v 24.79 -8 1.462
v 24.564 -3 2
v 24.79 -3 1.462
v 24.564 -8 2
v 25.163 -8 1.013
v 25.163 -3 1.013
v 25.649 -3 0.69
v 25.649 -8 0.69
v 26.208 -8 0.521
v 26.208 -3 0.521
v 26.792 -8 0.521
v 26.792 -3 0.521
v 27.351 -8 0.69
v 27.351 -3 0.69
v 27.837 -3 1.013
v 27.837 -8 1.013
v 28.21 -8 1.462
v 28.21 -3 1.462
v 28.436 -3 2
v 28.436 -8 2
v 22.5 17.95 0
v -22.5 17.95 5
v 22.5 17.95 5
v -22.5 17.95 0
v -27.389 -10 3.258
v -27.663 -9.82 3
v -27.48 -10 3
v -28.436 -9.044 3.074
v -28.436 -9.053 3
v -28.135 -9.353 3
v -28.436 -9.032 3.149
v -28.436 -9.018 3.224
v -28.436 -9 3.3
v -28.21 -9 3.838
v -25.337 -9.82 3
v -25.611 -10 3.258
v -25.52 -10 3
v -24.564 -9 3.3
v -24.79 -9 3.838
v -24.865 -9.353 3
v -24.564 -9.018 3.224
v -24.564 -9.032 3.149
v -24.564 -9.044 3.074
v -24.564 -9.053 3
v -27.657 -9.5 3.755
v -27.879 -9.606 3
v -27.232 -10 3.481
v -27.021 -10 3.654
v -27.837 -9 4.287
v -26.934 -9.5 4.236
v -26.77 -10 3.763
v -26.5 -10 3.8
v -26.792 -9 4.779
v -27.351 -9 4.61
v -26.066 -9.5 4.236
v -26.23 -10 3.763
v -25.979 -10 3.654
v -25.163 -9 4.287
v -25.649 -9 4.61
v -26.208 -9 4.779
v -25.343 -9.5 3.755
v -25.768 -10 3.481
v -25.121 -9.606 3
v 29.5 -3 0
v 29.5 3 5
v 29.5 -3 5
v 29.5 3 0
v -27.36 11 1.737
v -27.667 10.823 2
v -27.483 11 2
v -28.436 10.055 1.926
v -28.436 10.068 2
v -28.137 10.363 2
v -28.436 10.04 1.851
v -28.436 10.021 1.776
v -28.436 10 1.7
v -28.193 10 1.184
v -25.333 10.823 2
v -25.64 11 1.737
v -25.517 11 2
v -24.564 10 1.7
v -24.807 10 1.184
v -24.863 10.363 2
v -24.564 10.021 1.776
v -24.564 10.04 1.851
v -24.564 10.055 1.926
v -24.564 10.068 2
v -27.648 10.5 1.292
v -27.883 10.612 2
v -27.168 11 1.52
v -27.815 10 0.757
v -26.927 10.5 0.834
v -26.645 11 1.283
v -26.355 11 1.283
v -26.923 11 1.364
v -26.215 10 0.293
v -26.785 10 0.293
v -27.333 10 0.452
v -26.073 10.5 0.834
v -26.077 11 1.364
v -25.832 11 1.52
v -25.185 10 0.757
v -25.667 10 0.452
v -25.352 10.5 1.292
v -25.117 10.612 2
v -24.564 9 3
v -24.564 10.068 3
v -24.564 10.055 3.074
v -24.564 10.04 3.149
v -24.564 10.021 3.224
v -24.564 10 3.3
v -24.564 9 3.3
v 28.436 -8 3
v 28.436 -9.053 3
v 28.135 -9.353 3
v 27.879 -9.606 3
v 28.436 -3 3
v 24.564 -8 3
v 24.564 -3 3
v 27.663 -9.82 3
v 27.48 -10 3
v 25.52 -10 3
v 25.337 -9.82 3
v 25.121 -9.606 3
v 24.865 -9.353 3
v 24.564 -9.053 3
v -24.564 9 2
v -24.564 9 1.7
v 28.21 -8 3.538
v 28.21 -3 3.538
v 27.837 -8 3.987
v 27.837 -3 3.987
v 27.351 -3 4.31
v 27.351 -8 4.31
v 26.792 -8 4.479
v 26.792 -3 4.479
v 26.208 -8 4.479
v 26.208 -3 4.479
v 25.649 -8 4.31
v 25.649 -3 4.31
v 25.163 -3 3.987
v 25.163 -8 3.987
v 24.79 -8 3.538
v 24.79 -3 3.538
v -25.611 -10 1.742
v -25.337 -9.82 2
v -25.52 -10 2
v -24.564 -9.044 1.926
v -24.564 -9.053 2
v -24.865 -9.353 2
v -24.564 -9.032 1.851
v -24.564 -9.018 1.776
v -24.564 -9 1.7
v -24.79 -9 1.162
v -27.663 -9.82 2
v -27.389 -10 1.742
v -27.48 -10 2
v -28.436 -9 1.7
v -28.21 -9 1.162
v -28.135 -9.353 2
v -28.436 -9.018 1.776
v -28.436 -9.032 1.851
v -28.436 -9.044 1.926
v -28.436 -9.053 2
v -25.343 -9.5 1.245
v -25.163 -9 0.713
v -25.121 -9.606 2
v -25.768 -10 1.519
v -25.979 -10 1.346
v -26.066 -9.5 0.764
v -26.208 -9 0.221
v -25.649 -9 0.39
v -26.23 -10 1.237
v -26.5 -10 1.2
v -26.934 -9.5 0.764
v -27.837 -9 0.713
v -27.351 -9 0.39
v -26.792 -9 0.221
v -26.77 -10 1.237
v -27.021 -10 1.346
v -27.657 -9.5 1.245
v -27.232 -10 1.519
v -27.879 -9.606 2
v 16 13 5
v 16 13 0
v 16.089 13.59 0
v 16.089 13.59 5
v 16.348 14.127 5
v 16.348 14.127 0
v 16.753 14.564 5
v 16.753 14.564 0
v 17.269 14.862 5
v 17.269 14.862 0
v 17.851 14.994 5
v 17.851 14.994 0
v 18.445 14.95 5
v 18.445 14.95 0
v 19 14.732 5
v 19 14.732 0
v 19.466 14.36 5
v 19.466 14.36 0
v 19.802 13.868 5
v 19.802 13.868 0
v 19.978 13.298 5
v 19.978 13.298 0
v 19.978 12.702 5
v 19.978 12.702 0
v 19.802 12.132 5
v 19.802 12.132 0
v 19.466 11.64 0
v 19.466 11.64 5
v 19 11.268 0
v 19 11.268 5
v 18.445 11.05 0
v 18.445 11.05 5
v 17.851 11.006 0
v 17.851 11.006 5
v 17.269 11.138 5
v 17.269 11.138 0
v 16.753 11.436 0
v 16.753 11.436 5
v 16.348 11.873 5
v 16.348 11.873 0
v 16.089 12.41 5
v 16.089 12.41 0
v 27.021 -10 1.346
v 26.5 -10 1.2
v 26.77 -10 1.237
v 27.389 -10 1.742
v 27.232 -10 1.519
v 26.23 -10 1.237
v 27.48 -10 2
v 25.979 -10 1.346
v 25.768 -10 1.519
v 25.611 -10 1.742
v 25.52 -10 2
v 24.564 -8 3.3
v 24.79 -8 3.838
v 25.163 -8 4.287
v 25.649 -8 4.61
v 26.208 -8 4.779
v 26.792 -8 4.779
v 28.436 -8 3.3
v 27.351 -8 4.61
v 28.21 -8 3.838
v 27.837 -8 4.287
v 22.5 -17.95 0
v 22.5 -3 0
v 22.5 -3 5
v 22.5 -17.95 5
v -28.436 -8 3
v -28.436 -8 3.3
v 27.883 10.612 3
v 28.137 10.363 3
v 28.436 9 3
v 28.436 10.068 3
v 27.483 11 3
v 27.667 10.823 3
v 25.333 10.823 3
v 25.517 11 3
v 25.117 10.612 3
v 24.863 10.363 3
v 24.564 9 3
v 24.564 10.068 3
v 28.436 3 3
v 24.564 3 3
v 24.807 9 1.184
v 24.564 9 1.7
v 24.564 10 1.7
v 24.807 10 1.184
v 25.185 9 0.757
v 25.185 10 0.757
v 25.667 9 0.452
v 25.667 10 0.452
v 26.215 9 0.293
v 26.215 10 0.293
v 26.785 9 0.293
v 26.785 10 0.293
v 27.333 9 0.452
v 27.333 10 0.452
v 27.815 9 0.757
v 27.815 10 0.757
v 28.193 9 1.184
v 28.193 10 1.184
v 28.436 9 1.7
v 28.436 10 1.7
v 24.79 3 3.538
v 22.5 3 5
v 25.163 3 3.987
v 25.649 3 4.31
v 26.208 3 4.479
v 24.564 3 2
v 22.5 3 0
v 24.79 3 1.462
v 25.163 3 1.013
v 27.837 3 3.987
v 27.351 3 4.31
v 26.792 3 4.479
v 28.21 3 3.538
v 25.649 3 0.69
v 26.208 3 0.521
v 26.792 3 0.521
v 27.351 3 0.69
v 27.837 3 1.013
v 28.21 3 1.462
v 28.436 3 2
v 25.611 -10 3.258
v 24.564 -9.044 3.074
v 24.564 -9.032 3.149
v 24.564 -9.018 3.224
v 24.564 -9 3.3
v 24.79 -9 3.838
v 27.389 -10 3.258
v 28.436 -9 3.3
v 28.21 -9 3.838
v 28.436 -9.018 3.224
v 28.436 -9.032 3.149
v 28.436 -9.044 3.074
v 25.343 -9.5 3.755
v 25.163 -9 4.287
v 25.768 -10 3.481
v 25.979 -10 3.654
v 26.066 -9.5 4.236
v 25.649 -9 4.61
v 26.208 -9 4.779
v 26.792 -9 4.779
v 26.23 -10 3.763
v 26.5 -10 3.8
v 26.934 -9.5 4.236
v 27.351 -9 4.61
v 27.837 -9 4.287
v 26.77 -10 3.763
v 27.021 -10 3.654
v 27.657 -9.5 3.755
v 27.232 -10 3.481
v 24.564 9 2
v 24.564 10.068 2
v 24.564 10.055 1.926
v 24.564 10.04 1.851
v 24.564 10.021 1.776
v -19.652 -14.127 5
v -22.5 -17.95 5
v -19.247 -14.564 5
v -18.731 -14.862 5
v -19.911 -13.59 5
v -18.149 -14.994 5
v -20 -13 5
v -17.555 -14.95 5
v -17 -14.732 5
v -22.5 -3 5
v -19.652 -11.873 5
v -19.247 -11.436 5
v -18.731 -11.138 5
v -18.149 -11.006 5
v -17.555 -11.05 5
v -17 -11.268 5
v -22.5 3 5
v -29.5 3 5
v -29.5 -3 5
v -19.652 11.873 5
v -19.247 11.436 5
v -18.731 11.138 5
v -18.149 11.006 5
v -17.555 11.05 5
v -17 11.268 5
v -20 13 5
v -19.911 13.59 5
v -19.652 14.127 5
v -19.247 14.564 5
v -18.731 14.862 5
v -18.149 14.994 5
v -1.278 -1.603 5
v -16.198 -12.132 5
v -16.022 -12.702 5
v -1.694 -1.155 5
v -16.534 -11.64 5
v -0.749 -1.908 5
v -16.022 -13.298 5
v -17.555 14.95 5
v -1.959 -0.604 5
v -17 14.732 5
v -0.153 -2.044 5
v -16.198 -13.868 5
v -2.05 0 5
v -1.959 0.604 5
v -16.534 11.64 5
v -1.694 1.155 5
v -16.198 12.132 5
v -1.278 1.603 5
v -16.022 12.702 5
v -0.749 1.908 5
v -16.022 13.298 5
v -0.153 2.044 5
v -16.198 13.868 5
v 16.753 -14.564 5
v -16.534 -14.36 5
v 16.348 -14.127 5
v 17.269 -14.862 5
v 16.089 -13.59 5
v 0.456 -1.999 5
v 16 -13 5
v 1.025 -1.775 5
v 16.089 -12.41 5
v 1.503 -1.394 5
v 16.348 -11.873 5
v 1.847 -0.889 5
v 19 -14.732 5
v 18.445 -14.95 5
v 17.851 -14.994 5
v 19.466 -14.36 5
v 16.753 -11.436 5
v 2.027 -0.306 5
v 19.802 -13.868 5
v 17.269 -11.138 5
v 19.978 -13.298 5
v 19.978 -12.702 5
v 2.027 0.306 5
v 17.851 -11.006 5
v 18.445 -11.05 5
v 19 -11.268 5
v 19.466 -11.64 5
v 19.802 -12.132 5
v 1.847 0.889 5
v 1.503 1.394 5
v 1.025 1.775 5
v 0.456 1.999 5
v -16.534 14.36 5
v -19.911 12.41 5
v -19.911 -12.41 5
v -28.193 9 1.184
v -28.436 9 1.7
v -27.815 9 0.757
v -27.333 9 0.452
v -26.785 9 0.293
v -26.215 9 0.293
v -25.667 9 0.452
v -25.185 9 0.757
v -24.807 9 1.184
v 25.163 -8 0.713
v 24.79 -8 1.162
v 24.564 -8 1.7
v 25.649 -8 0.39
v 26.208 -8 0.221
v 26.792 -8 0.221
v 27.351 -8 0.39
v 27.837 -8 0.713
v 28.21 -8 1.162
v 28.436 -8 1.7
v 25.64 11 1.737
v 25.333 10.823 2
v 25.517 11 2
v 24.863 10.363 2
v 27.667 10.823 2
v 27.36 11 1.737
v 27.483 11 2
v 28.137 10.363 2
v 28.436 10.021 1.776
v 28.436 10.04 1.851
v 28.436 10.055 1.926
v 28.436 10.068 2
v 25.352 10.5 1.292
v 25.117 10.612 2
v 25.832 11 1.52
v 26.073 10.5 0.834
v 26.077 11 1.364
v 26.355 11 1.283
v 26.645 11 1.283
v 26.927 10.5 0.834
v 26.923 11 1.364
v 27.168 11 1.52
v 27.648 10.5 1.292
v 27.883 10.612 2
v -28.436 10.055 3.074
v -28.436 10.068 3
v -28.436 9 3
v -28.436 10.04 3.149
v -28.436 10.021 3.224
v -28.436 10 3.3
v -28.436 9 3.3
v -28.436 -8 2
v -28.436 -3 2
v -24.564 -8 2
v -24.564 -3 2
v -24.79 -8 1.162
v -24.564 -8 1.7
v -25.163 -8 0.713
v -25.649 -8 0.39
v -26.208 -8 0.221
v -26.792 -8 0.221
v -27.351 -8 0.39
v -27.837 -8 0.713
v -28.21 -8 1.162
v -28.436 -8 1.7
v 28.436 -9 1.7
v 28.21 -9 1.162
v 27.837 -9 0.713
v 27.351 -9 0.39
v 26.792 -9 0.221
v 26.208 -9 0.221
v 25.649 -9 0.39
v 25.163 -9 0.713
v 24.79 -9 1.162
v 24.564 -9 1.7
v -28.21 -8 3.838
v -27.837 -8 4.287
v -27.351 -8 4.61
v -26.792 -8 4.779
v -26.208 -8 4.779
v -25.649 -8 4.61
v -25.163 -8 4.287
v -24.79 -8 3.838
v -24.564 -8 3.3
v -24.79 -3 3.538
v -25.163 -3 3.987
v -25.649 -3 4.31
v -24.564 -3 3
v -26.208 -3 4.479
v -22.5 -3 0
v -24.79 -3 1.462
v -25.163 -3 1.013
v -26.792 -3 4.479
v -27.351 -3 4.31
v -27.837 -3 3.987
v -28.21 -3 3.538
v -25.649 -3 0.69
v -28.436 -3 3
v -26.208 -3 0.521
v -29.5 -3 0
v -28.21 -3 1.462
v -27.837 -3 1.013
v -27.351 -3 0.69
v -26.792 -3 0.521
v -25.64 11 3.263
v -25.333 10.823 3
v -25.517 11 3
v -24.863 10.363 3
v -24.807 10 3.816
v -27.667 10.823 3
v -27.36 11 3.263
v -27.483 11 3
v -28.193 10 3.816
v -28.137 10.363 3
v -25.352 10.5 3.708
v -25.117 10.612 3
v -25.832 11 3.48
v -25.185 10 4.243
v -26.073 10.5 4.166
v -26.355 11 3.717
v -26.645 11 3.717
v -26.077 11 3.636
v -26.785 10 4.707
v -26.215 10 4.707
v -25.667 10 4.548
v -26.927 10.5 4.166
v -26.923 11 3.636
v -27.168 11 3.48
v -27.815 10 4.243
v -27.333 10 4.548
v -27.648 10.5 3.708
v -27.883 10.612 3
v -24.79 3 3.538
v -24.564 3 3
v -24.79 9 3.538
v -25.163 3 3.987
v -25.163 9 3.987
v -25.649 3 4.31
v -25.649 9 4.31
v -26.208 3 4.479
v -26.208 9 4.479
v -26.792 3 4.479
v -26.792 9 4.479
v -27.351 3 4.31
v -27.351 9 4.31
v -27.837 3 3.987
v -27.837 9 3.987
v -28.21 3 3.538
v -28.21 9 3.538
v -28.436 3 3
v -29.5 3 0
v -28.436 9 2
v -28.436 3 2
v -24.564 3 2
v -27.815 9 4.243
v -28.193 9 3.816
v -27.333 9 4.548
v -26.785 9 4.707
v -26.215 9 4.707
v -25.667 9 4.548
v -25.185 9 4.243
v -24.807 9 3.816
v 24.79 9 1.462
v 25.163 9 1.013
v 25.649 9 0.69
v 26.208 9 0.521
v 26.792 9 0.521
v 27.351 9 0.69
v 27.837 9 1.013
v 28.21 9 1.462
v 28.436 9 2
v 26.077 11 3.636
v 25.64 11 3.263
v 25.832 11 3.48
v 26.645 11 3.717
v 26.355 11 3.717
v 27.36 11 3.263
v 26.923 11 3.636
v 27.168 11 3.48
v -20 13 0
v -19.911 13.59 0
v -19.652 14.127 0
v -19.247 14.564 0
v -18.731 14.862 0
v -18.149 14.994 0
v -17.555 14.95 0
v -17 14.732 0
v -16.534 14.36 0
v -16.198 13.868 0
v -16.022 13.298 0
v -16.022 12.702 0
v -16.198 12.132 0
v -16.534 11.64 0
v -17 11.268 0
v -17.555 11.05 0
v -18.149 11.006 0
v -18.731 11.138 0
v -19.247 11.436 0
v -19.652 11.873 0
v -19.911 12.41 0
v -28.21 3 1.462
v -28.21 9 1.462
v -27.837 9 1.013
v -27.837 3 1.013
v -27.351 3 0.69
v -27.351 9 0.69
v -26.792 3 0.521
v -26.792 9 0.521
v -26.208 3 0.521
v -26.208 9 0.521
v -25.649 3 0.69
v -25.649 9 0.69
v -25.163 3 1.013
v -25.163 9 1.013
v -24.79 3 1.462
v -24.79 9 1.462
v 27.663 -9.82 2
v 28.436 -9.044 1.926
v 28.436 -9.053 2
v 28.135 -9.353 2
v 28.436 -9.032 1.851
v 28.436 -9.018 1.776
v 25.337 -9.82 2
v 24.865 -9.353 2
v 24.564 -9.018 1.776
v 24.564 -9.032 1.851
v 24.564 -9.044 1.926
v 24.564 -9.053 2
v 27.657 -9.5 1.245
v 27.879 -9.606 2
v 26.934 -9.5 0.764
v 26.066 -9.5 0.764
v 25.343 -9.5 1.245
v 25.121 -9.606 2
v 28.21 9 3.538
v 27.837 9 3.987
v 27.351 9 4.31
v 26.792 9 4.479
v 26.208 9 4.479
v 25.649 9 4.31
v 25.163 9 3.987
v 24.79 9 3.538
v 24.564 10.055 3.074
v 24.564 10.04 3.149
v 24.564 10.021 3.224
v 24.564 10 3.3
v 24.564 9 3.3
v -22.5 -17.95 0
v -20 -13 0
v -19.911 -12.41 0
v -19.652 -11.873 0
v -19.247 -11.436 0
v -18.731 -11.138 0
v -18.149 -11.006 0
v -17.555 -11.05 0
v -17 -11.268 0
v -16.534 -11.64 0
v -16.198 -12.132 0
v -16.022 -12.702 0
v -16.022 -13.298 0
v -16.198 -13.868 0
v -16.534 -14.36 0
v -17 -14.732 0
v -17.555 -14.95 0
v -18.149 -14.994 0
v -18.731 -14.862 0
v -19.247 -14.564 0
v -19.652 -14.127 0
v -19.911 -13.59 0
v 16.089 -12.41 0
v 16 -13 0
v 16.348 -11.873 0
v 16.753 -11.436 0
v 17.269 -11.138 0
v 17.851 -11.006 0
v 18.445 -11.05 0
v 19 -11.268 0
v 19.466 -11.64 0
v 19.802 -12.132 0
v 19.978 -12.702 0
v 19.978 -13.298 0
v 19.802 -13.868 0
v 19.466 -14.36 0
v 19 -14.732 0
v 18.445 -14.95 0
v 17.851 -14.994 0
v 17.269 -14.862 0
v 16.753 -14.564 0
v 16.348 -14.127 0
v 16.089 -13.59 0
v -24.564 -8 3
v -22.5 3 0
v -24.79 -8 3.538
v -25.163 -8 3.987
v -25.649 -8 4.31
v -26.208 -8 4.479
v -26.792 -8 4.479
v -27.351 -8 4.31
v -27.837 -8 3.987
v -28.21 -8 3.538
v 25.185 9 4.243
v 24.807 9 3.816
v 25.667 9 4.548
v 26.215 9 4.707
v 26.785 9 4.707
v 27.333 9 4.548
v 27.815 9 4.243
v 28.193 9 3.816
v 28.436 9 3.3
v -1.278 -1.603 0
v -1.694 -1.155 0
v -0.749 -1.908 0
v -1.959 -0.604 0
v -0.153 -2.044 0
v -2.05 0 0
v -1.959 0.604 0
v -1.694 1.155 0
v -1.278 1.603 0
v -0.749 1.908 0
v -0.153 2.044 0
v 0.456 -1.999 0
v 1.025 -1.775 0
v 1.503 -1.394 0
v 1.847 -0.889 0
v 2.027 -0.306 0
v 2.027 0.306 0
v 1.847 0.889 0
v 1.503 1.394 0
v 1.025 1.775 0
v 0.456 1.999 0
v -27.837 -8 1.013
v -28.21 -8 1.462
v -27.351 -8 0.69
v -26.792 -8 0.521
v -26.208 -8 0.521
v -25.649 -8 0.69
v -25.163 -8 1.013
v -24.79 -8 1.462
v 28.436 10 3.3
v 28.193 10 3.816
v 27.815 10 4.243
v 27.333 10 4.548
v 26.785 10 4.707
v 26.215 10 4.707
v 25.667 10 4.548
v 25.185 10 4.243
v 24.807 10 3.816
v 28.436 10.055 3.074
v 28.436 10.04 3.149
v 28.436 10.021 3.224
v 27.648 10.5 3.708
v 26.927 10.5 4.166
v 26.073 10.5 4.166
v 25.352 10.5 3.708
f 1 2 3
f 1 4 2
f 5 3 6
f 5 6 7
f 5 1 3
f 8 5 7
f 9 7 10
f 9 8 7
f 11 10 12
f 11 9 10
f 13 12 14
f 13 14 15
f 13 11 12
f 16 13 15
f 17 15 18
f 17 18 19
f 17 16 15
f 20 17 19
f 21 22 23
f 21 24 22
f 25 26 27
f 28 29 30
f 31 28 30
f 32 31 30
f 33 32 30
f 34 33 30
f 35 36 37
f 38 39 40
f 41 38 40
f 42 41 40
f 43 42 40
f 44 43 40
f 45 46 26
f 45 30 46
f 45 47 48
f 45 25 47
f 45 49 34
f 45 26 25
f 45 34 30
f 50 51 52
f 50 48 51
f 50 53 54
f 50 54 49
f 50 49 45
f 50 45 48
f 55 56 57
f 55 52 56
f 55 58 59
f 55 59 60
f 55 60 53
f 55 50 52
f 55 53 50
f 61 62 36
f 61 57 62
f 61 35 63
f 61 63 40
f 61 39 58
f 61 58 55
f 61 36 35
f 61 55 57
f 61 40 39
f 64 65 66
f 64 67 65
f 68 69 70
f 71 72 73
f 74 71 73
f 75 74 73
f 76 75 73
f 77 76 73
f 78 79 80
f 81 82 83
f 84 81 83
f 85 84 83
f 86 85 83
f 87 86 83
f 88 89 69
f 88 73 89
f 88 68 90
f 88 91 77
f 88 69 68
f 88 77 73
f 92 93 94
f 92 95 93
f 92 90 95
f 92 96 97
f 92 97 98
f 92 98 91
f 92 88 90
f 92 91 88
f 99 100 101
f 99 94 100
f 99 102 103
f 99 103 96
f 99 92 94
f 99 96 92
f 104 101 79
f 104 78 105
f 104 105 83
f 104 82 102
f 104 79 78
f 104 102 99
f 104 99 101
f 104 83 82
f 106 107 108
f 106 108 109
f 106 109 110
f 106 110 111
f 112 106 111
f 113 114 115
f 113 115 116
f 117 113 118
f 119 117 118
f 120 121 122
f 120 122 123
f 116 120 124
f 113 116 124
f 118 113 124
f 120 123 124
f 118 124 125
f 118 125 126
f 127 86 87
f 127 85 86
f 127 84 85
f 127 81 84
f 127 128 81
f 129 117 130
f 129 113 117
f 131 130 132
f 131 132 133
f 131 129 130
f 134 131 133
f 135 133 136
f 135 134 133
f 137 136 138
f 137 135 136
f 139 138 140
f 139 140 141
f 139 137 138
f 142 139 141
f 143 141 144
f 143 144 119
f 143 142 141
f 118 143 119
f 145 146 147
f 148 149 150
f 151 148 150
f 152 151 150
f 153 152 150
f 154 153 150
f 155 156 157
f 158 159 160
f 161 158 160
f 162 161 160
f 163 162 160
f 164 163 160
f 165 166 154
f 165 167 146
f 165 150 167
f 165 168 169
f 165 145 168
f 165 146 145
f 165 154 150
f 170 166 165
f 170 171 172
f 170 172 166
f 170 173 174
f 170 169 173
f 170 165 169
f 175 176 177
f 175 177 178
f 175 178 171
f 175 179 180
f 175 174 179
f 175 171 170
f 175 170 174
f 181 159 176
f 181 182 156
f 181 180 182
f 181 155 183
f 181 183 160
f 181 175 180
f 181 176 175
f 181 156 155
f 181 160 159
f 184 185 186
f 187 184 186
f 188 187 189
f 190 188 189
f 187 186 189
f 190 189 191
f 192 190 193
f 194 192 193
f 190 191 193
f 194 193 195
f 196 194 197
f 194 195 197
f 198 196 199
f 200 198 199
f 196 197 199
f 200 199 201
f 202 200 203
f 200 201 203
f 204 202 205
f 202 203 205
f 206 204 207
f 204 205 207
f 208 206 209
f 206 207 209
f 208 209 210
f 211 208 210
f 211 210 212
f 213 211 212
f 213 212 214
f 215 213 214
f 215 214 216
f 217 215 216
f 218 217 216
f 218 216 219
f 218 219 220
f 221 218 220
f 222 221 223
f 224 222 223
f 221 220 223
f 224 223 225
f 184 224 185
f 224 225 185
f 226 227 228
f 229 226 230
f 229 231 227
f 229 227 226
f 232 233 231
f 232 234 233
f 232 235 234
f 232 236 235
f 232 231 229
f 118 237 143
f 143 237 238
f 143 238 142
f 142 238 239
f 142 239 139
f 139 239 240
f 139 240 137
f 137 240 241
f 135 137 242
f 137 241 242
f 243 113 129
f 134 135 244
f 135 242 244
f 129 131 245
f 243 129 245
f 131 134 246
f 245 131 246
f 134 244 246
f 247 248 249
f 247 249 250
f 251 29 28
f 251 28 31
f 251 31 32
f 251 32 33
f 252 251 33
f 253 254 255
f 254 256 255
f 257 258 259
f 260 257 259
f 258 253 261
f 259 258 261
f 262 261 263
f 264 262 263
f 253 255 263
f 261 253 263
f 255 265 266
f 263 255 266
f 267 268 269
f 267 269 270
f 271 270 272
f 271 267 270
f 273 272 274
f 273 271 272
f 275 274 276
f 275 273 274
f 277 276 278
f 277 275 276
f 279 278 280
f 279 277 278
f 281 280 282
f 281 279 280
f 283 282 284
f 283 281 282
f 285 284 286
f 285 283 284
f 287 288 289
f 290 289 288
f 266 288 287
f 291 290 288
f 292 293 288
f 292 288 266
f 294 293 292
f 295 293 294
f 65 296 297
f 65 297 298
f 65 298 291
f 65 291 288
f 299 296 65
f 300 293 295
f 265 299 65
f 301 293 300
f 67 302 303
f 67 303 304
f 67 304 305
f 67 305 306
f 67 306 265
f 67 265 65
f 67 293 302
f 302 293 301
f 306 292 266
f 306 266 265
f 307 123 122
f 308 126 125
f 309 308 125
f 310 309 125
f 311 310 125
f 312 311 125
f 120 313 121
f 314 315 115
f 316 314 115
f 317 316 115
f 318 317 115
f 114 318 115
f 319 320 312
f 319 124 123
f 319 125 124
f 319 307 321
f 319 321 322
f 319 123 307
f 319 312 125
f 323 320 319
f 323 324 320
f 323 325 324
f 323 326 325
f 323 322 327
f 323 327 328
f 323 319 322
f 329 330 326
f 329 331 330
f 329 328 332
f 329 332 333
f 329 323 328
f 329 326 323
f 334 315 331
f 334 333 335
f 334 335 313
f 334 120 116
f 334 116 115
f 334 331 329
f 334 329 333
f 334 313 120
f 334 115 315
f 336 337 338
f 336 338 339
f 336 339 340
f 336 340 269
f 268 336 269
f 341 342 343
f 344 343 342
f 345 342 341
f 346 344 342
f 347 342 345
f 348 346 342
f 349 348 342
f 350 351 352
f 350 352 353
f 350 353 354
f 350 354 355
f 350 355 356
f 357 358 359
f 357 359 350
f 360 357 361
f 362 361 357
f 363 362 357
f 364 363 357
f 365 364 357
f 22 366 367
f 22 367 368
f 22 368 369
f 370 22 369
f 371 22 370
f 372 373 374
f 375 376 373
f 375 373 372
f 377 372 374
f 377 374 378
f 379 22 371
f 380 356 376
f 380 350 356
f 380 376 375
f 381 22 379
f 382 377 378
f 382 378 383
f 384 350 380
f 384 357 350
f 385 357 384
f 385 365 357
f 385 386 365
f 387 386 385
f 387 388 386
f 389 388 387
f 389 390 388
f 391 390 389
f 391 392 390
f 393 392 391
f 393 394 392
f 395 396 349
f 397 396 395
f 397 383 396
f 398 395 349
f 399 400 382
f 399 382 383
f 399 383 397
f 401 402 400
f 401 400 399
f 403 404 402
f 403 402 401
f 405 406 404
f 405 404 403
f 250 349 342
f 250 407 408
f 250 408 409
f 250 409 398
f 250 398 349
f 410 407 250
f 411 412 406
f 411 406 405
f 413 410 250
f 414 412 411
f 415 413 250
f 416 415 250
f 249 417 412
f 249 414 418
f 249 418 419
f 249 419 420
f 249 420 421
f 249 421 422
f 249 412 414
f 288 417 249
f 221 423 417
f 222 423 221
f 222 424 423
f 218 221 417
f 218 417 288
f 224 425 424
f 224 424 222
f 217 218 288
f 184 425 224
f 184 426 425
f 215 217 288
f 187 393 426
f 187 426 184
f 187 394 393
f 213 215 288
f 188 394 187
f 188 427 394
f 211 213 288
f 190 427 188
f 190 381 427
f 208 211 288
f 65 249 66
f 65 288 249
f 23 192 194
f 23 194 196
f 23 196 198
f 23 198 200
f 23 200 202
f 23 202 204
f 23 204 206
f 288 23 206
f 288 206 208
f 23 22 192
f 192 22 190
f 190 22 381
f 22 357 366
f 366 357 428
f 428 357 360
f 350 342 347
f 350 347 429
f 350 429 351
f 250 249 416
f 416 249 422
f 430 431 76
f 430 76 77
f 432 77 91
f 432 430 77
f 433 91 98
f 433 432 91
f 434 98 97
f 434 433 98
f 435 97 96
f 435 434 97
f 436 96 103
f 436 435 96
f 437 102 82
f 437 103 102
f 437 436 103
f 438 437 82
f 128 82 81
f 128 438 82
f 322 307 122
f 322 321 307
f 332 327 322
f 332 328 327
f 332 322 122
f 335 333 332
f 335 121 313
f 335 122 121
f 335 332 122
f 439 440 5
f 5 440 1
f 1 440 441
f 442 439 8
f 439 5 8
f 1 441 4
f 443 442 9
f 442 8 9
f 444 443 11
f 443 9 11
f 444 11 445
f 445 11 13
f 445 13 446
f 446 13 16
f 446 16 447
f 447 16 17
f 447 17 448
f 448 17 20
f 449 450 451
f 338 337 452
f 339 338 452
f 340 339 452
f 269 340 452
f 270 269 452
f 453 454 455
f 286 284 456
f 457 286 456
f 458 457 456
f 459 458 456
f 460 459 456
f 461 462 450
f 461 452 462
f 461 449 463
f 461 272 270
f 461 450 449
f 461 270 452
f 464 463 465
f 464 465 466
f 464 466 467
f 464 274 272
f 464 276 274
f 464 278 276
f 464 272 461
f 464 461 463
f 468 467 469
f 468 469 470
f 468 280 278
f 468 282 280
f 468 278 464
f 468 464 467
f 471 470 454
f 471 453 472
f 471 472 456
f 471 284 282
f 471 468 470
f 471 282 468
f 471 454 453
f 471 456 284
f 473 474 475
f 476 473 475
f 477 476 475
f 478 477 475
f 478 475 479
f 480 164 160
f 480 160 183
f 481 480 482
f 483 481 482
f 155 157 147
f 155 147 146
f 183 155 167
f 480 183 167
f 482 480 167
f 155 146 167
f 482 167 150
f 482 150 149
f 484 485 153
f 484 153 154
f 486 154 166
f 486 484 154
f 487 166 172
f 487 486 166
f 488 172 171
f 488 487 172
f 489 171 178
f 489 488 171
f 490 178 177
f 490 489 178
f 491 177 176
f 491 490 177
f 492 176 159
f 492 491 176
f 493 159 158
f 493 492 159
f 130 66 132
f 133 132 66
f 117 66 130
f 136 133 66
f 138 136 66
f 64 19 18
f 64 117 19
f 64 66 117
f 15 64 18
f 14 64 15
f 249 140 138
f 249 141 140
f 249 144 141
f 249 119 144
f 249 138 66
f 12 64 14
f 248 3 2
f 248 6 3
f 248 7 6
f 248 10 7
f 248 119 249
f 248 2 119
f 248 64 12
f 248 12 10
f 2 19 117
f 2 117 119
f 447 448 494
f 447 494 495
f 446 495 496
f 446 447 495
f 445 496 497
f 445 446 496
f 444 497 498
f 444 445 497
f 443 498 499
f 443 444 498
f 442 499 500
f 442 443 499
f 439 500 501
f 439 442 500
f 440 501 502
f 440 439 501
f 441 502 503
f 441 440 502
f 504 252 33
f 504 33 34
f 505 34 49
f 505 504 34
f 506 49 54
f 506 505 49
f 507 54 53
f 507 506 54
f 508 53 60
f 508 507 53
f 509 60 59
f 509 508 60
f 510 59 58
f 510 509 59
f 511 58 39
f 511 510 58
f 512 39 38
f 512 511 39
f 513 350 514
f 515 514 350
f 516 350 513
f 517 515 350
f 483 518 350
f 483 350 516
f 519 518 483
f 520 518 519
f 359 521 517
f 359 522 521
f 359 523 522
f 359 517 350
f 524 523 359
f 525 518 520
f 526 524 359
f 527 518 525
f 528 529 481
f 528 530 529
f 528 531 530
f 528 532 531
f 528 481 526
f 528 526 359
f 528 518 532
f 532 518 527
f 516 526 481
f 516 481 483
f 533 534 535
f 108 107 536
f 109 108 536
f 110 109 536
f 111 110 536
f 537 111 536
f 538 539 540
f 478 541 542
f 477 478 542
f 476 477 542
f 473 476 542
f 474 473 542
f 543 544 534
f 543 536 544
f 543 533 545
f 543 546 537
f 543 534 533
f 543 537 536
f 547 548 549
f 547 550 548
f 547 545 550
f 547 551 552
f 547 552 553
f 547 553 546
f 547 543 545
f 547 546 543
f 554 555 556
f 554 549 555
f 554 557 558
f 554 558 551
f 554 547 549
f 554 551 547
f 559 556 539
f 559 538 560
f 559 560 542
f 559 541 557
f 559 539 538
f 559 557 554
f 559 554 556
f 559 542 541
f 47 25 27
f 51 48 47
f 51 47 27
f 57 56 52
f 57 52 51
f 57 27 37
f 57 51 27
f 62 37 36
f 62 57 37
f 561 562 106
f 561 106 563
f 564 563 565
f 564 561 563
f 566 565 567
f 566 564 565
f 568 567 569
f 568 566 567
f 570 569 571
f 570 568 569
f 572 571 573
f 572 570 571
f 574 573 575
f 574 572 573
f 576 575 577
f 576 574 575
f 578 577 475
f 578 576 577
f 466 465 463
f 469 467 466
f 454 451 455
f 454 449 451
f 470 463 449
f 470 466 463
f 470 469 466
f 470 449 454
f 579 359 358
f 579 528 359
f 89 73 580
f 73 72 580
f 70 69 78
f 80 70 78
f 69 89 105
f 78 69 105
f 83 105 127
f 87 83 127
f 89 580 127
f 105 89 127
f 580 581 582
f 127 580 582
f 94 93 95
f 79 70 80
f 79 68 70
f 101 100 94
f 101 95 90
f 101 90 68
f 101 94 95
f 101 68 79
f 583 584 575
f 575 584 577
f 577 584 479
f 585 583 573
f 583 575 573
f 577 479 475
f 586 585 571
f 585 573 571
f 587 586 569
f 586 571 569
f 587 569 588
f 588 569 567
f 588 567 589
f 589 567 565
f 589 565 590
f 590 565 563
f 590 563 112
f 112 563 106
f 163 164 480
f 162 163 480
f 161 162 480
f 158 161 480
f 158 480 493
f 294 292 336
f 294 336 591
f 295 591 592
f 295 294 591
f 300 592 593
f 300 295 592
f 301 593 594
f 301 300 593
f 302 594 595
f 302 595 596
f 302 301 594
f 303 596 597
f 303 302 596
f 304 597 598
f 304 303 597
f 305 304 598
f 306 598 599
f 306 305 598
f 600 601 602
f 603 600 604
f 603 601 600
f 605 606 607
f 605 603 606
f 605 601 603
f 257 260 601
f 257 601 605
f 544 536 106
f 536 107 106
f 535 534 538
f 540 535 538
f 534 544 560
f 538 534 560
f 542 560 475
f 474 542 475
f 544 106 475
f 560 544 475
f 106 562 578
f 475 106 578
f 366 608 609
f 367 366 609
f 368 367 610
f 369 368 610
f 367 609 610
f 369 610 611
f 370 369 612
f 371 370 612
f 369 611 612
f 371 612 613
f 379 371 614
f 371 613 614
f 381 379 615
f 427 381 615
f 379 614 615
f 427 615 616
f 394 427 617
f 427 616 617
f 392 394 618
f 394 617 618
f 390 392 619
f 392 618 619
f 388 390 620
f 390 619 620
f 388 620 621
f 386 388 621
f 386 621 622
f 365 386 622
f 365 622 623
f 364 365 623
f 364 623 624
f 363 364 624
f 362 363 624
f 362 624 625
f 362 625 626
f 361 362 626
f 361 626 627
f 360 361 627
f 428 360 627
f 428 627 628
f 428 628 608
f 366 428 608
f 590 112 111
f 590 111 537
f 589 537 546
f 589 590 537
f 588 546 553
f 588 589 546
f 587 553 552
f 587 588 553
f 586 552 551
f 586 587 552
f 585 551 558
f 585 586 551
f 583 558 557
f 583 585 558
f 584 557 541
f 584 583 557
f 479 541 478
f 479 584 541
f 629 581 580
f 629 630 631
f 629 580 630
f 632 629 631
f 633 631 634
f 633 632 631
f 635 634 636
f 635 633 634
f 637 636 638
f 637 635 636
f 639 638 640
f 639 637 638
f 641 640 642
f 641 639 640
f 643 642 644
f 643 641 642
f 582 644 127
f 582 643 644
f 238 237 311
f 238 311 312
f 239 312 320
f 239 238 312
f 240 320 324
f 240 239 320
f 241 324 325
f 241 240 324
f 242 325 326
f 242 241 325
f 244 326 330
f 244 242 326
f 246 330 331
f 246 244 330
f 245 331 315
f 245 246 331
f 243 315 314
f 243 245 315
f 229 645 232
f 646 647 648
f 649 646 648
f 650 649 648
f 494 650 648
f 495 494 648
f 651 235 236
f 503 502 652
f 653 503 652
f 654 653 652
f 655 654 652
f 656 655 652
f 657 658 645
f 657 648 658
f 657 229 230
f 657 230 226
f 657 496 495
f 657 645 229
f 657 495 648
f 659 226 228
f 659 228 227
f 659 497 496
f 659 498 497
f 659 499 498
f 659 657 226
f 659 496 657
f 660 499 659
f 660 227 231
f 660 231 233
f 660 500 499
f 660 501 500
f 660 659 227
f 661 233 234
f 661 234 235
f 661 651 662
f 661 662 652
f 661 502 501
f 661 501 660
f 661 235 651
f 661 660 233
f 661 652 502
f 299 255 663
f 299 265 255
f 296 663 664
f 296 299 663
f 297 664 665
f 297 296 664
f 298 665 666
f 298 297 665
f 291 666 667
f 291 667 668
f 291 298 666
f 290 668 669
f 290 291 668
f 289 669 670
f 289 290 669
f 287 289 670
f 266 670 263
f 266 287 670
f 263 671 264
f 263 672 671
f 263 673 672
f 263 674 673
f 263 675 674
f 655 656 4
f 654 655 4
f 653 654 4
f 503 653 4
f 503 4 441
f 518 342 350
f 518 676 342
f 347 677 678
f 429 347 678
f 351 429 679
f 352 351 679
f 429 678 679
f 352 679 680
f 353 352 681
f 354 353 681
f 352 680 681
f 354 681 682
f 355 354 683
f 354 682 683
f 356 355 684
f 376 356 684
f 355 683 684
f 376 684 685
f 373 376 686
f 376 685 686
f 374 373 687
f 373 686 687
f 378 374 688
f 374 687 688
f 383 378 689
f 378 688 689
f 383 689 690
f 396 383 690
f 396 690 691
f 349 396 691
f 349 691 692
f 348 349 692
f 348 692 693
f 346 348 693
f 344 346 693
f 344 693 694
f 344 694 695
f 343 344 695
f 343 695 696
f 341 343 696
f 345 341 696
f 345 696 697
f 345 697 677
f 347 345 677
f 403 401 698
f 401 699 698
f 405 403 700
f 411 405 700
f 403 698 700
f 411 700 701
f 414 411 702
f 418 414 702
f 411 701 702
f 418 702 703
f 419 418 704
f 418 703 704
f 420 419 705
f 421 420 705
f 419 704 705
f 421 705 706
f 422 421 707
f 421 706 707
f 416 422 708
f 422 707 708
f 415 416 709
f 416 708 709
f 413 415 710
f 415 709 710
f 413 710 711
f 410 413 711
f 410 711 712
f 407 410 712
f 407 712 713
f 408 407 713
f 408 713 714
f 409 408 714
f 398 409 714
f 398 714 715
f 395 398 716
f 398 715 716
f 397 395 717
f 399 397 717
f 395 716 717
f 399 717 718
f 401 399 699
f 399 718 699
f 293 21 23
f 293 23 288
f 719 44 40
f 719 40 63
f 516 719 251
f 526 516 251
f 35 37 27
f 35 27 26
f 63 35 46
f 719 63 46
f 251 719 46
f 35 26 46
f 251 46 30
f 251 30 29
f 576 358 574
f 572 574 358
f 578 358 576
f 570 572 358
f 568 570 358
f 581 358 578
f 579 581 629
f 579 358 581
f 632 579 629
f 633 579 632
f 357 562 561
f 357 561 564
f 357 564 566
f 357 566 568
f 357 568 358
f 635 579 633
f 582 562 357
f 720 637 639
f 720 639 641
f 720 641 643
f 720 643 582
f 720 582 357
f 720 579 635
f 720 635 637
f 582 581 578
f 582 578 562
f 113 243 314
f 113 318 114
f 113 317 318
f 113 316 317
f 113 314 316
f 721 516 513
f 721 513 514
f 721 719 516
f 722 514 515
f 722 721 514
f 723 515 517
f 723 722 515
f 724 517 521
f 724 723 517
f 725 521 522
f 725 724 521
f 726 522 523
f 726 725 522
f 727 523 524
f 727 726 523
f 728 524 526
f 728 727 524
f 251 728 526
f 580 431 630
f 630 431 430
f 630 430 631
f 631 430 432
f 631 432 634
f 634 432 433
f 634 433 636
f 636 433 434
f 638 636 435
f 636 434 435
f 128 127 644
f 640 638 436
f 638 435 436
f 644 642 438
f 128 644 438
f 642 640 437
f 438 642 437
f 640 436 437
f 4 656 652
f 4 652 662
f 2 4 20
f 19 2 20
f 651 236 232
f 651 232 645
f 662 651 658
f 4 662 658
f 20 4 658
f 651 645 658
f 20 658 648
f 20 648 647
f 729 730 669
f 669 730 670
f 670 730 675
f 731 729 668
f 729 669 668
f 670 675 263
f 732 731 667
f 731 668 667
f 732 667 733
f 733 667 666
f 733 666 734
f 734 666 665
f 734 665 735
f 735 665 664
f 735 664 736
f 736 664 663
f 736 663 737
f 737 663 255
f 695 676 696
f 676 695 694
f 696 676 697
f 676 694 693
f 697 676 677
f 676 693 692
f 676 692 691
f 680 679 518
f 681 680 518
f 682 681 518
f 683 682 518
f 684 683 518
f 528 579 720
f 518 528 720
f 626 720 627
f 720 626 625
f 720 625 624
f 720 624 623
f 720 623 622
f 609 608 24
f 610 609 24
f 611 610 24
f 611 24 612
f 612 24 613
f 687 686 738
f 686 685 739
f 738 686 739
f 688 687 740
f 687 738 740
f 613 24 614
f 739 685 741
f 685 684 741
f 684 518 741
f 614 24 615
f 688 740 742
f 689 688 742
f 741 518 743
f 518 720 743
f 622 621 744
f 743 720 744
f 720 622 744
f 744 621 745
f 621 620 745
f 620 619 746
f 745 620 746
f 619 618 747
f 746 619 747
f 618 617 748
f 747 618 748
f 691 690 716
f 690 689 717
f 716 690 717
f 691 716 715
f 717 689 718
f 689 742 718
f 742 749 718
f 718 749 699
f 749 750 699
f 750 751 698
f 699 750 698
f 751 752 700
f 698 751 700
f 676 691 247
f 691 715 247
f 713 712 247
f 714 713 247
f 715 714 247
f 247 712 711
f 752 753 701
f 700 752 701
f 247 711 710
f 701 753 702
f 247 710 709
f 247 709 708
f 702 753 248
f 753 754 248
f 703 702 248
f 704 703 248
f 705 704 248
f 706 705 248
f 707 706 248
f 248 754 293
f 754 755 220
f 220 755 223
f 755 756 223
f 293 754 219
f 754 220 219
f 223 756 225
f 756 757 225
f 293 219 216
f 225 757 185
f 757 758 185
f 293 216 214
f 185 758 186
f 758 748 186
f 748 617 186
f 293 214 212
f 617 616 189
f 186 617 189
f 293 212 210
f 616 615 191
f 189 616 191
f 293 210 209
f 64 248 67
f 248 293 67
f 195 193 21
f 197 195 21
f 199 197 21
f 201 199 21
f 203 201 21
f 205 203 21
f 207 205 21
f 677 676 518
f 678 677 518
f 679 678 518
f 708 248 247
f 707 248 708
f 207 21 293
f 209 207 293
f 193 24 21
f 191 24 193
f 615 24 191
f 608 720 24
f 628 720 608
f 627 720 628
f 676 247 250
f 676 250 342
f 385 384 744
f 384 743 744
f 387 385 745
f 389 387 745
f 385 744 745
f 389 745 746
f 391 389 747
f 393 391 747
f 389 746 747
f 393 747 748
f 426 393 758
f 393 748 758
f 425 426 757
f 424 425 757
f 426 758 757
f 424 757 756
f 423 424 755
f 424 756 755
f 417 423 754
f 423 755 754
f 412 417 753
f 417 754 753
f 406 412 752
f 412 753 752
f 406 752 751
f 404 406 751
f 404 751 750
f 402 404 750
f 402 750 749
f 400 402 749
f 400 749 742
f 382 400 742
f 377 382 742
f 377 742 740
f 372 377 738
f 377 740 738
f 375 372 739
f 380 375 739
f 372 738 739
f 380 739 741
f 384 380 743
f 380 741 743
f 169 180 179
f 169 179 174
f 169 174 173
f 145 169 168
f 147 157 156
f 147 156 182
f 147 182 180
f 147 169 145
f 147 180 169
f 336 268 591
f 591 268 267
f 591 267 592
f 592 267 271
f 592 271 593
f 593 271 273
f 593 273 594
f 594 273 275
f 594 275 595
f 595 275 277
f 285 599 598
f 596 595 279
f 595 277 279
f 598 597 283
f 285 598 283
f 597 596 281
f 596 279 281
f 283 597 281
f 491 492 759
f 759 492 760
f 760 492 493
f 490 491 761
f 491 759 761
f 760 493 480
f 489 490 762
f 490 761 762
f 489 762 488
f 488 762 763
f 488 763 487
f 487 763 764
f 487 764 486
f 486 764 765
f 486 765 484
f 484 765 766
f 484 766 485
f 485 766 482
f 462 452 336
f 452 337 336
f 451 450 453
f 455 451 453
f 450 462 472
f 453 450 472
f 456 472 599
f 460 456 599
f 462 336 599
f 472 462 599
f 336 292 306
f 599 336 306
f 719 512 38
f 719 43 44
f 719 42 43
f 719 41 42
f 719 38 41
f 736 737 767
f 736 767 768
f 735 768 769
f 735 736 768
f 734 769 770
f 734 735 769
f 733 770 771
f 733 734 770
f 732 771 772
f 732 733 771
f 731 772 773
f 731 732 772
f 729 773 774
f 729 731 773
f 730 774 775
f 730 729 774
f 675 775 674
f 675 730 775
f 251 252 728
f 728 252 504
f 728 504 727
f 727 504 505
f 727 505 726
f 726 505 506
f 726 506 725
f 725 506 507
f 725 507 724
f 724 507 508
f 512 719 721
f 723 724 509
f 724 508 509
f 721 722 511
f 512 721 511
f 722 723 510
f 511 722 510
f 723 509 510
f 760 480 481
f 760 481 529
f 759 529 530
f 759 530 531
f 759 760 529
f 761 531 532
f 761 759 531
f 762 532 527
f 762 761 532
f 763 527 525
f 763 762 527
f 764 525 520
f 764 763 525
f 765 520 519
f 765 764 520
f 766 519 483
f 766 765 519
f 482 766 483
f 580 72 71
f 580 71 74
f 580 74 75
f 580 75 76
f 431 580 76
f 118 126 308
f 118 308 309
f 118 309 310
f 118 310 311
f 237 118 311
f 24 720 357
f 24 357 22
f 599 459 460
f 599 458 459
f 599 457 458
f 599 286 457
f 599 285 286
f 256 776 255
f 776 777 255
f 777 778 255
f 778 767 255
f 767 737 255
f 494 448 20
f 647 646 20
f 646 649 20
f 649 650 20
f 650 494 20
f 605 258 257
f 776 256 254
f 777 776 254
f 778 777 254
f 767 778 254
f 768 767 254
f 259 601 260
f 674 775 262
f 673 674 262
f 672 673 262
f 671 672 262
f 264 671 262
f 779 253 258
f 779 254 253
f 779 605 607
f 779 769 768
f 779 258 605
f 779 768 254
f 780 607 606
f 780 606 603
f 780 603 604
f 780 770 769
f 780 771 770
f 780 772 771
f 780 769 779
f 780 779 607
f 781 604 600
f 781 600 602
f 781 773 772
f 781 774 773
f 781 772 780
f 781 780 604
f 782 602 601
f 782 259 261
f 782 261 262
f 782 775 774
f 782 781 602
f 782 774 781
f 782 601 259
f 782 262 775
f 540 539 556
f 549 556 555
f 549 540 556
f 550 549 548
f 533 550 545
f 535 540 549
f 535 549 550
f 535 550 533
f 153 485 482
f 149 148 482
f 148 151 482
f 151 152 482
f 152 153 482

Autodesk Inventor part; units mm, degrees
ref_plane "YZ Plane" through (0, 0, 0) normal (1, 0, 0) x (0, 1, 0)
ref_plane "XZ Plane" through (0, 0, 0) normal (0, 1, 0) x (-1, 0, 0)
sketch "Sketch1" plane through (0, 0, 0) normal (0, 0, 1) x (1, 0, 0)
  line L0 (-22.5, 17.95) -> (22.5, 17.95)
  line L1 (22.5, 17.95) -> (22.5, -17.95)
  line L2 (22.5, -17.95) -> (-22.5, -17.95)
  line L3 (-22.5, -17.95) -> (-22.5, 17.95)
  line L4 (-29.5, 3) -> (29.5, 3)
  line L5 (29.5, 3) -> (29.5, -3)
  line L6 (29.5, -3) -> (-29.5, -3)
  line L7 (-29.5, -3) -> (-29.5, 3)
  line L8 (-22.5, -17.95) -> (22.5, 17.95) construction
  line L9 (-22.5, 17.95) -> (22.5, -17.95) construction
  line L10 (29.5, 3) -> (-29.5, -3) construction
  line L11 (-29.5, 3) -> (29.5, -3) construction
  point P0 (0, 0)
  point P1 (0, 0)
  point P2 (0, 0)
  dimension "d8" = 35.9
  dimension "d9" = 45
  dimension "d10" = 6
  dimension "d11" = 59
extrude "Extrusion1" add sketch "Sketch1" along normal blind 5
sketch "Sketch2" plane through (0, 0, 0) normal (0, 0, -1) x (-1, 0, 0)
  circle A0 centre (0, 0) radius 2.05
  circle A1 centre (-18, 13) radius 2
  line L0 (0, 0) -> (16.3137, 0) construction
  line L1 (0, 0) -> (0, -11.5343) construction
  circle A2 centre (18, 13) radius 2
  circle A3 centre (-18, -13) radius 2
  circle A4 centre (18, -13) radius 2
  dimension "d2" = 4
  dimension "d3" = 36
  dimension "d4" = 26
  dimension "d5" = 4.1
extrude "Extrusion2" cut sketch "Sketch2" against normal blind 5
sketch "Sketch3" plane through (-29.5, 3, 0) normal (0, 1, 0) x (1, 0, 0)
  line L0 (0, 0) -> (0, -5) projected
  line L1 (0, 0) -> (7, 0) projected
  line L2 (1.0635, -2) -> (4.9365, -2)
  line L3 (4.9365, -3) -> (1.0635, -3)
  arc A0 (1.0635, -3) -> (4.9365, -3) centre (3, -2.5) ccw
  arc A1 (4.9365, -2) -> (1.0635, -2) centre (3, -2.5) ccw
  point P0 (29.5, 0)
  dimension "d13" = 3
  dimension "d14" = 2.5
  dimension "d15" = 0.5
  dimension "d16" = 0.5
  dimension "d19" = 2
  dimension "d20" = 2
extrude "Extrusion3" add sketch "Sketch3" along normal blind 6 and the other way blind 11
sketch "Sketch4" plane through (-29.5, 9, 0) normal (0, 1, 0) x (1, 0, 0)
  line L0 (1.0635, -2) -> (4.9365, -2) projected
  arc A0 (4.9365, -2) -> (1.0635, -2) centre (3, -2.5) ccw projected
  line L1 (4.9365, -3) -> (1.0635, -3) projected
  arc A1 (1.0635, -3) -> (4.9365, -3) centre (3, -2.5) ccw projected
  line L2 (1.0635, -1.7) -> (4.9365, -1.7)
  arc A2 (4.9365, -1.7) -> (1.0635, -1.7) centre (3, -2.3) ccw
  line L3 (1.0635, -2) -> (1.0635, -1.7)
  line L4 (4.9365, -1.7) -> (4.9365, -2)
  line L5 (3, -2.5) -> (0.4845, -2.5) construction
  arc A3 (1.0635, -3) -> (4.9365, -3) centre (3, -2.5) ccw
  line L6 (1.0635, -3.3) -> (4.9365, -3.3)
  arc A4 (1.0635, -3.3) -> (4.9365, -3.3) centre (3, -2.7) ccw
  line L7 (1.0635, -3) -> (1.0635, -3.3)
  line L8 (4.9365, -3) -> (4.9365, -3.3)
  point P0 (29.5, 0)
  dimension "d32" = 0.2
  dimension "d33" = 0.3
extrude "Extrusion4" add sketch "Sketch4" along normal blind 2
sketch "Sketch5" plane through (-29.5, -8, 0) normal (0, -1, 0) x (1, 0, 0)
  line L0 (4.9365, 2) -> (1.0635, 2) projected
  arc A0 (1.0635, 2) -> (4.9365, 2) centre (3, 2.5) ccw projected
  line L1 (1.0635, 3) -> (4.9365, 3) projected
  arc A1 (4.9365, 3) -> (1.0635, 3) centre (3, 2.5) ccw projected
  line L2 (4.9365, 1.7) -> (1.0635, 1.7)
  arc A2 (1.0635, 1.7) -> (4.9365, 1.7) centre (3, 2.2) ccw
  line L3 (4.9365, 1.7) -> (4.9365, 2)
  line L4 (1.0635, 2) -> (1.0635, 1.7)
  line L5 (3, 2.5) -> (4.482, 2.5)
  line L6 (4.9365, 3.3) -> (1.0635, 3.3)
  arc A3 (4.9365, 3.3) -> (1.0635, 3.3) centre (3, 2.8) ccw
  line L7 (4.9365, 3.3) -> (4.9365, 3)
  line L8 (1.0635, 3) -> (1.0635, 3.3)
  point P0 (29.5, 0)
  dimension "d35" = 0.3
  dimension "d36" = 0.3
  dimension "d37" = 2
extrude "Extrusion5" add sketch "Sketch5" along normal blind 2
sketch "Sketch7" plane through (0, 0, 5) normal (0, 0, 1) x (1, 0, 0)
  circle A0 centre (18, -13) radius 2 projected
  circle A1 centre (-18, 13) radius 2 projected
  circle A2 centre (18, 13) radius 2 projected
  circle A3 centre (-18, -13) radius 2 projected
  circle A4 centre (0, 0) radius 2.05 projected
  line L0 (-22.5, -3) -> (-22.5, -17.95) projected
  line L1 (-22.5, -17.95) -> (22.5, -17.95) projected
  line L2 (22.5, -17.95) -> (22.5, -3) projected
  line L3 (22.5, -3) -> (29.5, -3) projected
  line L4 (29.5, -3) -> (29.5, 3) projected
  line L5 (29.5, 3) -> (22.5, 3) projected
  line L6 (22.5, 3) -> (22.5, 17.95) projected
  line L7 (22.5, 17.95) -> (-22.5, 17.95) projected
  line L8 (-22.5, 17.95) -> (-22.5, 3) projected
  line L9 (-22.5, 3) -> (-29.5, 3) projected
  line L10 (-29.5, 3) -> (-29.5, -3) projected
  line L11 (-29.5, -3) -> (-22.5, -3) projected
ref_plane "Work Plane1" through (0, 0, 5) normal (1, 0, 0) x (0, 0, -1)
mirror "Mirror1" about plane through (0, 0, 5) normal (1, 0, 0) of "Extrusion3", "Extrusion4", "Extrusion5"
chamfer "Chamfer1" distance 1 angle 45 2 edges at (-26.5, 11, 0.2727) (-26.5, 11, 4.7273)
chamfer "Chamfer2" distance 1 angle 45 6 edges at (-26.5, -10, 0.2) (-26.5, -10, 4.8) (26.5, 11, 0.2727) (26.5, 11, 4.7273) (26.5, -10, 0.2) (26.5, -10, 4.8)
properties part number "mover01"
